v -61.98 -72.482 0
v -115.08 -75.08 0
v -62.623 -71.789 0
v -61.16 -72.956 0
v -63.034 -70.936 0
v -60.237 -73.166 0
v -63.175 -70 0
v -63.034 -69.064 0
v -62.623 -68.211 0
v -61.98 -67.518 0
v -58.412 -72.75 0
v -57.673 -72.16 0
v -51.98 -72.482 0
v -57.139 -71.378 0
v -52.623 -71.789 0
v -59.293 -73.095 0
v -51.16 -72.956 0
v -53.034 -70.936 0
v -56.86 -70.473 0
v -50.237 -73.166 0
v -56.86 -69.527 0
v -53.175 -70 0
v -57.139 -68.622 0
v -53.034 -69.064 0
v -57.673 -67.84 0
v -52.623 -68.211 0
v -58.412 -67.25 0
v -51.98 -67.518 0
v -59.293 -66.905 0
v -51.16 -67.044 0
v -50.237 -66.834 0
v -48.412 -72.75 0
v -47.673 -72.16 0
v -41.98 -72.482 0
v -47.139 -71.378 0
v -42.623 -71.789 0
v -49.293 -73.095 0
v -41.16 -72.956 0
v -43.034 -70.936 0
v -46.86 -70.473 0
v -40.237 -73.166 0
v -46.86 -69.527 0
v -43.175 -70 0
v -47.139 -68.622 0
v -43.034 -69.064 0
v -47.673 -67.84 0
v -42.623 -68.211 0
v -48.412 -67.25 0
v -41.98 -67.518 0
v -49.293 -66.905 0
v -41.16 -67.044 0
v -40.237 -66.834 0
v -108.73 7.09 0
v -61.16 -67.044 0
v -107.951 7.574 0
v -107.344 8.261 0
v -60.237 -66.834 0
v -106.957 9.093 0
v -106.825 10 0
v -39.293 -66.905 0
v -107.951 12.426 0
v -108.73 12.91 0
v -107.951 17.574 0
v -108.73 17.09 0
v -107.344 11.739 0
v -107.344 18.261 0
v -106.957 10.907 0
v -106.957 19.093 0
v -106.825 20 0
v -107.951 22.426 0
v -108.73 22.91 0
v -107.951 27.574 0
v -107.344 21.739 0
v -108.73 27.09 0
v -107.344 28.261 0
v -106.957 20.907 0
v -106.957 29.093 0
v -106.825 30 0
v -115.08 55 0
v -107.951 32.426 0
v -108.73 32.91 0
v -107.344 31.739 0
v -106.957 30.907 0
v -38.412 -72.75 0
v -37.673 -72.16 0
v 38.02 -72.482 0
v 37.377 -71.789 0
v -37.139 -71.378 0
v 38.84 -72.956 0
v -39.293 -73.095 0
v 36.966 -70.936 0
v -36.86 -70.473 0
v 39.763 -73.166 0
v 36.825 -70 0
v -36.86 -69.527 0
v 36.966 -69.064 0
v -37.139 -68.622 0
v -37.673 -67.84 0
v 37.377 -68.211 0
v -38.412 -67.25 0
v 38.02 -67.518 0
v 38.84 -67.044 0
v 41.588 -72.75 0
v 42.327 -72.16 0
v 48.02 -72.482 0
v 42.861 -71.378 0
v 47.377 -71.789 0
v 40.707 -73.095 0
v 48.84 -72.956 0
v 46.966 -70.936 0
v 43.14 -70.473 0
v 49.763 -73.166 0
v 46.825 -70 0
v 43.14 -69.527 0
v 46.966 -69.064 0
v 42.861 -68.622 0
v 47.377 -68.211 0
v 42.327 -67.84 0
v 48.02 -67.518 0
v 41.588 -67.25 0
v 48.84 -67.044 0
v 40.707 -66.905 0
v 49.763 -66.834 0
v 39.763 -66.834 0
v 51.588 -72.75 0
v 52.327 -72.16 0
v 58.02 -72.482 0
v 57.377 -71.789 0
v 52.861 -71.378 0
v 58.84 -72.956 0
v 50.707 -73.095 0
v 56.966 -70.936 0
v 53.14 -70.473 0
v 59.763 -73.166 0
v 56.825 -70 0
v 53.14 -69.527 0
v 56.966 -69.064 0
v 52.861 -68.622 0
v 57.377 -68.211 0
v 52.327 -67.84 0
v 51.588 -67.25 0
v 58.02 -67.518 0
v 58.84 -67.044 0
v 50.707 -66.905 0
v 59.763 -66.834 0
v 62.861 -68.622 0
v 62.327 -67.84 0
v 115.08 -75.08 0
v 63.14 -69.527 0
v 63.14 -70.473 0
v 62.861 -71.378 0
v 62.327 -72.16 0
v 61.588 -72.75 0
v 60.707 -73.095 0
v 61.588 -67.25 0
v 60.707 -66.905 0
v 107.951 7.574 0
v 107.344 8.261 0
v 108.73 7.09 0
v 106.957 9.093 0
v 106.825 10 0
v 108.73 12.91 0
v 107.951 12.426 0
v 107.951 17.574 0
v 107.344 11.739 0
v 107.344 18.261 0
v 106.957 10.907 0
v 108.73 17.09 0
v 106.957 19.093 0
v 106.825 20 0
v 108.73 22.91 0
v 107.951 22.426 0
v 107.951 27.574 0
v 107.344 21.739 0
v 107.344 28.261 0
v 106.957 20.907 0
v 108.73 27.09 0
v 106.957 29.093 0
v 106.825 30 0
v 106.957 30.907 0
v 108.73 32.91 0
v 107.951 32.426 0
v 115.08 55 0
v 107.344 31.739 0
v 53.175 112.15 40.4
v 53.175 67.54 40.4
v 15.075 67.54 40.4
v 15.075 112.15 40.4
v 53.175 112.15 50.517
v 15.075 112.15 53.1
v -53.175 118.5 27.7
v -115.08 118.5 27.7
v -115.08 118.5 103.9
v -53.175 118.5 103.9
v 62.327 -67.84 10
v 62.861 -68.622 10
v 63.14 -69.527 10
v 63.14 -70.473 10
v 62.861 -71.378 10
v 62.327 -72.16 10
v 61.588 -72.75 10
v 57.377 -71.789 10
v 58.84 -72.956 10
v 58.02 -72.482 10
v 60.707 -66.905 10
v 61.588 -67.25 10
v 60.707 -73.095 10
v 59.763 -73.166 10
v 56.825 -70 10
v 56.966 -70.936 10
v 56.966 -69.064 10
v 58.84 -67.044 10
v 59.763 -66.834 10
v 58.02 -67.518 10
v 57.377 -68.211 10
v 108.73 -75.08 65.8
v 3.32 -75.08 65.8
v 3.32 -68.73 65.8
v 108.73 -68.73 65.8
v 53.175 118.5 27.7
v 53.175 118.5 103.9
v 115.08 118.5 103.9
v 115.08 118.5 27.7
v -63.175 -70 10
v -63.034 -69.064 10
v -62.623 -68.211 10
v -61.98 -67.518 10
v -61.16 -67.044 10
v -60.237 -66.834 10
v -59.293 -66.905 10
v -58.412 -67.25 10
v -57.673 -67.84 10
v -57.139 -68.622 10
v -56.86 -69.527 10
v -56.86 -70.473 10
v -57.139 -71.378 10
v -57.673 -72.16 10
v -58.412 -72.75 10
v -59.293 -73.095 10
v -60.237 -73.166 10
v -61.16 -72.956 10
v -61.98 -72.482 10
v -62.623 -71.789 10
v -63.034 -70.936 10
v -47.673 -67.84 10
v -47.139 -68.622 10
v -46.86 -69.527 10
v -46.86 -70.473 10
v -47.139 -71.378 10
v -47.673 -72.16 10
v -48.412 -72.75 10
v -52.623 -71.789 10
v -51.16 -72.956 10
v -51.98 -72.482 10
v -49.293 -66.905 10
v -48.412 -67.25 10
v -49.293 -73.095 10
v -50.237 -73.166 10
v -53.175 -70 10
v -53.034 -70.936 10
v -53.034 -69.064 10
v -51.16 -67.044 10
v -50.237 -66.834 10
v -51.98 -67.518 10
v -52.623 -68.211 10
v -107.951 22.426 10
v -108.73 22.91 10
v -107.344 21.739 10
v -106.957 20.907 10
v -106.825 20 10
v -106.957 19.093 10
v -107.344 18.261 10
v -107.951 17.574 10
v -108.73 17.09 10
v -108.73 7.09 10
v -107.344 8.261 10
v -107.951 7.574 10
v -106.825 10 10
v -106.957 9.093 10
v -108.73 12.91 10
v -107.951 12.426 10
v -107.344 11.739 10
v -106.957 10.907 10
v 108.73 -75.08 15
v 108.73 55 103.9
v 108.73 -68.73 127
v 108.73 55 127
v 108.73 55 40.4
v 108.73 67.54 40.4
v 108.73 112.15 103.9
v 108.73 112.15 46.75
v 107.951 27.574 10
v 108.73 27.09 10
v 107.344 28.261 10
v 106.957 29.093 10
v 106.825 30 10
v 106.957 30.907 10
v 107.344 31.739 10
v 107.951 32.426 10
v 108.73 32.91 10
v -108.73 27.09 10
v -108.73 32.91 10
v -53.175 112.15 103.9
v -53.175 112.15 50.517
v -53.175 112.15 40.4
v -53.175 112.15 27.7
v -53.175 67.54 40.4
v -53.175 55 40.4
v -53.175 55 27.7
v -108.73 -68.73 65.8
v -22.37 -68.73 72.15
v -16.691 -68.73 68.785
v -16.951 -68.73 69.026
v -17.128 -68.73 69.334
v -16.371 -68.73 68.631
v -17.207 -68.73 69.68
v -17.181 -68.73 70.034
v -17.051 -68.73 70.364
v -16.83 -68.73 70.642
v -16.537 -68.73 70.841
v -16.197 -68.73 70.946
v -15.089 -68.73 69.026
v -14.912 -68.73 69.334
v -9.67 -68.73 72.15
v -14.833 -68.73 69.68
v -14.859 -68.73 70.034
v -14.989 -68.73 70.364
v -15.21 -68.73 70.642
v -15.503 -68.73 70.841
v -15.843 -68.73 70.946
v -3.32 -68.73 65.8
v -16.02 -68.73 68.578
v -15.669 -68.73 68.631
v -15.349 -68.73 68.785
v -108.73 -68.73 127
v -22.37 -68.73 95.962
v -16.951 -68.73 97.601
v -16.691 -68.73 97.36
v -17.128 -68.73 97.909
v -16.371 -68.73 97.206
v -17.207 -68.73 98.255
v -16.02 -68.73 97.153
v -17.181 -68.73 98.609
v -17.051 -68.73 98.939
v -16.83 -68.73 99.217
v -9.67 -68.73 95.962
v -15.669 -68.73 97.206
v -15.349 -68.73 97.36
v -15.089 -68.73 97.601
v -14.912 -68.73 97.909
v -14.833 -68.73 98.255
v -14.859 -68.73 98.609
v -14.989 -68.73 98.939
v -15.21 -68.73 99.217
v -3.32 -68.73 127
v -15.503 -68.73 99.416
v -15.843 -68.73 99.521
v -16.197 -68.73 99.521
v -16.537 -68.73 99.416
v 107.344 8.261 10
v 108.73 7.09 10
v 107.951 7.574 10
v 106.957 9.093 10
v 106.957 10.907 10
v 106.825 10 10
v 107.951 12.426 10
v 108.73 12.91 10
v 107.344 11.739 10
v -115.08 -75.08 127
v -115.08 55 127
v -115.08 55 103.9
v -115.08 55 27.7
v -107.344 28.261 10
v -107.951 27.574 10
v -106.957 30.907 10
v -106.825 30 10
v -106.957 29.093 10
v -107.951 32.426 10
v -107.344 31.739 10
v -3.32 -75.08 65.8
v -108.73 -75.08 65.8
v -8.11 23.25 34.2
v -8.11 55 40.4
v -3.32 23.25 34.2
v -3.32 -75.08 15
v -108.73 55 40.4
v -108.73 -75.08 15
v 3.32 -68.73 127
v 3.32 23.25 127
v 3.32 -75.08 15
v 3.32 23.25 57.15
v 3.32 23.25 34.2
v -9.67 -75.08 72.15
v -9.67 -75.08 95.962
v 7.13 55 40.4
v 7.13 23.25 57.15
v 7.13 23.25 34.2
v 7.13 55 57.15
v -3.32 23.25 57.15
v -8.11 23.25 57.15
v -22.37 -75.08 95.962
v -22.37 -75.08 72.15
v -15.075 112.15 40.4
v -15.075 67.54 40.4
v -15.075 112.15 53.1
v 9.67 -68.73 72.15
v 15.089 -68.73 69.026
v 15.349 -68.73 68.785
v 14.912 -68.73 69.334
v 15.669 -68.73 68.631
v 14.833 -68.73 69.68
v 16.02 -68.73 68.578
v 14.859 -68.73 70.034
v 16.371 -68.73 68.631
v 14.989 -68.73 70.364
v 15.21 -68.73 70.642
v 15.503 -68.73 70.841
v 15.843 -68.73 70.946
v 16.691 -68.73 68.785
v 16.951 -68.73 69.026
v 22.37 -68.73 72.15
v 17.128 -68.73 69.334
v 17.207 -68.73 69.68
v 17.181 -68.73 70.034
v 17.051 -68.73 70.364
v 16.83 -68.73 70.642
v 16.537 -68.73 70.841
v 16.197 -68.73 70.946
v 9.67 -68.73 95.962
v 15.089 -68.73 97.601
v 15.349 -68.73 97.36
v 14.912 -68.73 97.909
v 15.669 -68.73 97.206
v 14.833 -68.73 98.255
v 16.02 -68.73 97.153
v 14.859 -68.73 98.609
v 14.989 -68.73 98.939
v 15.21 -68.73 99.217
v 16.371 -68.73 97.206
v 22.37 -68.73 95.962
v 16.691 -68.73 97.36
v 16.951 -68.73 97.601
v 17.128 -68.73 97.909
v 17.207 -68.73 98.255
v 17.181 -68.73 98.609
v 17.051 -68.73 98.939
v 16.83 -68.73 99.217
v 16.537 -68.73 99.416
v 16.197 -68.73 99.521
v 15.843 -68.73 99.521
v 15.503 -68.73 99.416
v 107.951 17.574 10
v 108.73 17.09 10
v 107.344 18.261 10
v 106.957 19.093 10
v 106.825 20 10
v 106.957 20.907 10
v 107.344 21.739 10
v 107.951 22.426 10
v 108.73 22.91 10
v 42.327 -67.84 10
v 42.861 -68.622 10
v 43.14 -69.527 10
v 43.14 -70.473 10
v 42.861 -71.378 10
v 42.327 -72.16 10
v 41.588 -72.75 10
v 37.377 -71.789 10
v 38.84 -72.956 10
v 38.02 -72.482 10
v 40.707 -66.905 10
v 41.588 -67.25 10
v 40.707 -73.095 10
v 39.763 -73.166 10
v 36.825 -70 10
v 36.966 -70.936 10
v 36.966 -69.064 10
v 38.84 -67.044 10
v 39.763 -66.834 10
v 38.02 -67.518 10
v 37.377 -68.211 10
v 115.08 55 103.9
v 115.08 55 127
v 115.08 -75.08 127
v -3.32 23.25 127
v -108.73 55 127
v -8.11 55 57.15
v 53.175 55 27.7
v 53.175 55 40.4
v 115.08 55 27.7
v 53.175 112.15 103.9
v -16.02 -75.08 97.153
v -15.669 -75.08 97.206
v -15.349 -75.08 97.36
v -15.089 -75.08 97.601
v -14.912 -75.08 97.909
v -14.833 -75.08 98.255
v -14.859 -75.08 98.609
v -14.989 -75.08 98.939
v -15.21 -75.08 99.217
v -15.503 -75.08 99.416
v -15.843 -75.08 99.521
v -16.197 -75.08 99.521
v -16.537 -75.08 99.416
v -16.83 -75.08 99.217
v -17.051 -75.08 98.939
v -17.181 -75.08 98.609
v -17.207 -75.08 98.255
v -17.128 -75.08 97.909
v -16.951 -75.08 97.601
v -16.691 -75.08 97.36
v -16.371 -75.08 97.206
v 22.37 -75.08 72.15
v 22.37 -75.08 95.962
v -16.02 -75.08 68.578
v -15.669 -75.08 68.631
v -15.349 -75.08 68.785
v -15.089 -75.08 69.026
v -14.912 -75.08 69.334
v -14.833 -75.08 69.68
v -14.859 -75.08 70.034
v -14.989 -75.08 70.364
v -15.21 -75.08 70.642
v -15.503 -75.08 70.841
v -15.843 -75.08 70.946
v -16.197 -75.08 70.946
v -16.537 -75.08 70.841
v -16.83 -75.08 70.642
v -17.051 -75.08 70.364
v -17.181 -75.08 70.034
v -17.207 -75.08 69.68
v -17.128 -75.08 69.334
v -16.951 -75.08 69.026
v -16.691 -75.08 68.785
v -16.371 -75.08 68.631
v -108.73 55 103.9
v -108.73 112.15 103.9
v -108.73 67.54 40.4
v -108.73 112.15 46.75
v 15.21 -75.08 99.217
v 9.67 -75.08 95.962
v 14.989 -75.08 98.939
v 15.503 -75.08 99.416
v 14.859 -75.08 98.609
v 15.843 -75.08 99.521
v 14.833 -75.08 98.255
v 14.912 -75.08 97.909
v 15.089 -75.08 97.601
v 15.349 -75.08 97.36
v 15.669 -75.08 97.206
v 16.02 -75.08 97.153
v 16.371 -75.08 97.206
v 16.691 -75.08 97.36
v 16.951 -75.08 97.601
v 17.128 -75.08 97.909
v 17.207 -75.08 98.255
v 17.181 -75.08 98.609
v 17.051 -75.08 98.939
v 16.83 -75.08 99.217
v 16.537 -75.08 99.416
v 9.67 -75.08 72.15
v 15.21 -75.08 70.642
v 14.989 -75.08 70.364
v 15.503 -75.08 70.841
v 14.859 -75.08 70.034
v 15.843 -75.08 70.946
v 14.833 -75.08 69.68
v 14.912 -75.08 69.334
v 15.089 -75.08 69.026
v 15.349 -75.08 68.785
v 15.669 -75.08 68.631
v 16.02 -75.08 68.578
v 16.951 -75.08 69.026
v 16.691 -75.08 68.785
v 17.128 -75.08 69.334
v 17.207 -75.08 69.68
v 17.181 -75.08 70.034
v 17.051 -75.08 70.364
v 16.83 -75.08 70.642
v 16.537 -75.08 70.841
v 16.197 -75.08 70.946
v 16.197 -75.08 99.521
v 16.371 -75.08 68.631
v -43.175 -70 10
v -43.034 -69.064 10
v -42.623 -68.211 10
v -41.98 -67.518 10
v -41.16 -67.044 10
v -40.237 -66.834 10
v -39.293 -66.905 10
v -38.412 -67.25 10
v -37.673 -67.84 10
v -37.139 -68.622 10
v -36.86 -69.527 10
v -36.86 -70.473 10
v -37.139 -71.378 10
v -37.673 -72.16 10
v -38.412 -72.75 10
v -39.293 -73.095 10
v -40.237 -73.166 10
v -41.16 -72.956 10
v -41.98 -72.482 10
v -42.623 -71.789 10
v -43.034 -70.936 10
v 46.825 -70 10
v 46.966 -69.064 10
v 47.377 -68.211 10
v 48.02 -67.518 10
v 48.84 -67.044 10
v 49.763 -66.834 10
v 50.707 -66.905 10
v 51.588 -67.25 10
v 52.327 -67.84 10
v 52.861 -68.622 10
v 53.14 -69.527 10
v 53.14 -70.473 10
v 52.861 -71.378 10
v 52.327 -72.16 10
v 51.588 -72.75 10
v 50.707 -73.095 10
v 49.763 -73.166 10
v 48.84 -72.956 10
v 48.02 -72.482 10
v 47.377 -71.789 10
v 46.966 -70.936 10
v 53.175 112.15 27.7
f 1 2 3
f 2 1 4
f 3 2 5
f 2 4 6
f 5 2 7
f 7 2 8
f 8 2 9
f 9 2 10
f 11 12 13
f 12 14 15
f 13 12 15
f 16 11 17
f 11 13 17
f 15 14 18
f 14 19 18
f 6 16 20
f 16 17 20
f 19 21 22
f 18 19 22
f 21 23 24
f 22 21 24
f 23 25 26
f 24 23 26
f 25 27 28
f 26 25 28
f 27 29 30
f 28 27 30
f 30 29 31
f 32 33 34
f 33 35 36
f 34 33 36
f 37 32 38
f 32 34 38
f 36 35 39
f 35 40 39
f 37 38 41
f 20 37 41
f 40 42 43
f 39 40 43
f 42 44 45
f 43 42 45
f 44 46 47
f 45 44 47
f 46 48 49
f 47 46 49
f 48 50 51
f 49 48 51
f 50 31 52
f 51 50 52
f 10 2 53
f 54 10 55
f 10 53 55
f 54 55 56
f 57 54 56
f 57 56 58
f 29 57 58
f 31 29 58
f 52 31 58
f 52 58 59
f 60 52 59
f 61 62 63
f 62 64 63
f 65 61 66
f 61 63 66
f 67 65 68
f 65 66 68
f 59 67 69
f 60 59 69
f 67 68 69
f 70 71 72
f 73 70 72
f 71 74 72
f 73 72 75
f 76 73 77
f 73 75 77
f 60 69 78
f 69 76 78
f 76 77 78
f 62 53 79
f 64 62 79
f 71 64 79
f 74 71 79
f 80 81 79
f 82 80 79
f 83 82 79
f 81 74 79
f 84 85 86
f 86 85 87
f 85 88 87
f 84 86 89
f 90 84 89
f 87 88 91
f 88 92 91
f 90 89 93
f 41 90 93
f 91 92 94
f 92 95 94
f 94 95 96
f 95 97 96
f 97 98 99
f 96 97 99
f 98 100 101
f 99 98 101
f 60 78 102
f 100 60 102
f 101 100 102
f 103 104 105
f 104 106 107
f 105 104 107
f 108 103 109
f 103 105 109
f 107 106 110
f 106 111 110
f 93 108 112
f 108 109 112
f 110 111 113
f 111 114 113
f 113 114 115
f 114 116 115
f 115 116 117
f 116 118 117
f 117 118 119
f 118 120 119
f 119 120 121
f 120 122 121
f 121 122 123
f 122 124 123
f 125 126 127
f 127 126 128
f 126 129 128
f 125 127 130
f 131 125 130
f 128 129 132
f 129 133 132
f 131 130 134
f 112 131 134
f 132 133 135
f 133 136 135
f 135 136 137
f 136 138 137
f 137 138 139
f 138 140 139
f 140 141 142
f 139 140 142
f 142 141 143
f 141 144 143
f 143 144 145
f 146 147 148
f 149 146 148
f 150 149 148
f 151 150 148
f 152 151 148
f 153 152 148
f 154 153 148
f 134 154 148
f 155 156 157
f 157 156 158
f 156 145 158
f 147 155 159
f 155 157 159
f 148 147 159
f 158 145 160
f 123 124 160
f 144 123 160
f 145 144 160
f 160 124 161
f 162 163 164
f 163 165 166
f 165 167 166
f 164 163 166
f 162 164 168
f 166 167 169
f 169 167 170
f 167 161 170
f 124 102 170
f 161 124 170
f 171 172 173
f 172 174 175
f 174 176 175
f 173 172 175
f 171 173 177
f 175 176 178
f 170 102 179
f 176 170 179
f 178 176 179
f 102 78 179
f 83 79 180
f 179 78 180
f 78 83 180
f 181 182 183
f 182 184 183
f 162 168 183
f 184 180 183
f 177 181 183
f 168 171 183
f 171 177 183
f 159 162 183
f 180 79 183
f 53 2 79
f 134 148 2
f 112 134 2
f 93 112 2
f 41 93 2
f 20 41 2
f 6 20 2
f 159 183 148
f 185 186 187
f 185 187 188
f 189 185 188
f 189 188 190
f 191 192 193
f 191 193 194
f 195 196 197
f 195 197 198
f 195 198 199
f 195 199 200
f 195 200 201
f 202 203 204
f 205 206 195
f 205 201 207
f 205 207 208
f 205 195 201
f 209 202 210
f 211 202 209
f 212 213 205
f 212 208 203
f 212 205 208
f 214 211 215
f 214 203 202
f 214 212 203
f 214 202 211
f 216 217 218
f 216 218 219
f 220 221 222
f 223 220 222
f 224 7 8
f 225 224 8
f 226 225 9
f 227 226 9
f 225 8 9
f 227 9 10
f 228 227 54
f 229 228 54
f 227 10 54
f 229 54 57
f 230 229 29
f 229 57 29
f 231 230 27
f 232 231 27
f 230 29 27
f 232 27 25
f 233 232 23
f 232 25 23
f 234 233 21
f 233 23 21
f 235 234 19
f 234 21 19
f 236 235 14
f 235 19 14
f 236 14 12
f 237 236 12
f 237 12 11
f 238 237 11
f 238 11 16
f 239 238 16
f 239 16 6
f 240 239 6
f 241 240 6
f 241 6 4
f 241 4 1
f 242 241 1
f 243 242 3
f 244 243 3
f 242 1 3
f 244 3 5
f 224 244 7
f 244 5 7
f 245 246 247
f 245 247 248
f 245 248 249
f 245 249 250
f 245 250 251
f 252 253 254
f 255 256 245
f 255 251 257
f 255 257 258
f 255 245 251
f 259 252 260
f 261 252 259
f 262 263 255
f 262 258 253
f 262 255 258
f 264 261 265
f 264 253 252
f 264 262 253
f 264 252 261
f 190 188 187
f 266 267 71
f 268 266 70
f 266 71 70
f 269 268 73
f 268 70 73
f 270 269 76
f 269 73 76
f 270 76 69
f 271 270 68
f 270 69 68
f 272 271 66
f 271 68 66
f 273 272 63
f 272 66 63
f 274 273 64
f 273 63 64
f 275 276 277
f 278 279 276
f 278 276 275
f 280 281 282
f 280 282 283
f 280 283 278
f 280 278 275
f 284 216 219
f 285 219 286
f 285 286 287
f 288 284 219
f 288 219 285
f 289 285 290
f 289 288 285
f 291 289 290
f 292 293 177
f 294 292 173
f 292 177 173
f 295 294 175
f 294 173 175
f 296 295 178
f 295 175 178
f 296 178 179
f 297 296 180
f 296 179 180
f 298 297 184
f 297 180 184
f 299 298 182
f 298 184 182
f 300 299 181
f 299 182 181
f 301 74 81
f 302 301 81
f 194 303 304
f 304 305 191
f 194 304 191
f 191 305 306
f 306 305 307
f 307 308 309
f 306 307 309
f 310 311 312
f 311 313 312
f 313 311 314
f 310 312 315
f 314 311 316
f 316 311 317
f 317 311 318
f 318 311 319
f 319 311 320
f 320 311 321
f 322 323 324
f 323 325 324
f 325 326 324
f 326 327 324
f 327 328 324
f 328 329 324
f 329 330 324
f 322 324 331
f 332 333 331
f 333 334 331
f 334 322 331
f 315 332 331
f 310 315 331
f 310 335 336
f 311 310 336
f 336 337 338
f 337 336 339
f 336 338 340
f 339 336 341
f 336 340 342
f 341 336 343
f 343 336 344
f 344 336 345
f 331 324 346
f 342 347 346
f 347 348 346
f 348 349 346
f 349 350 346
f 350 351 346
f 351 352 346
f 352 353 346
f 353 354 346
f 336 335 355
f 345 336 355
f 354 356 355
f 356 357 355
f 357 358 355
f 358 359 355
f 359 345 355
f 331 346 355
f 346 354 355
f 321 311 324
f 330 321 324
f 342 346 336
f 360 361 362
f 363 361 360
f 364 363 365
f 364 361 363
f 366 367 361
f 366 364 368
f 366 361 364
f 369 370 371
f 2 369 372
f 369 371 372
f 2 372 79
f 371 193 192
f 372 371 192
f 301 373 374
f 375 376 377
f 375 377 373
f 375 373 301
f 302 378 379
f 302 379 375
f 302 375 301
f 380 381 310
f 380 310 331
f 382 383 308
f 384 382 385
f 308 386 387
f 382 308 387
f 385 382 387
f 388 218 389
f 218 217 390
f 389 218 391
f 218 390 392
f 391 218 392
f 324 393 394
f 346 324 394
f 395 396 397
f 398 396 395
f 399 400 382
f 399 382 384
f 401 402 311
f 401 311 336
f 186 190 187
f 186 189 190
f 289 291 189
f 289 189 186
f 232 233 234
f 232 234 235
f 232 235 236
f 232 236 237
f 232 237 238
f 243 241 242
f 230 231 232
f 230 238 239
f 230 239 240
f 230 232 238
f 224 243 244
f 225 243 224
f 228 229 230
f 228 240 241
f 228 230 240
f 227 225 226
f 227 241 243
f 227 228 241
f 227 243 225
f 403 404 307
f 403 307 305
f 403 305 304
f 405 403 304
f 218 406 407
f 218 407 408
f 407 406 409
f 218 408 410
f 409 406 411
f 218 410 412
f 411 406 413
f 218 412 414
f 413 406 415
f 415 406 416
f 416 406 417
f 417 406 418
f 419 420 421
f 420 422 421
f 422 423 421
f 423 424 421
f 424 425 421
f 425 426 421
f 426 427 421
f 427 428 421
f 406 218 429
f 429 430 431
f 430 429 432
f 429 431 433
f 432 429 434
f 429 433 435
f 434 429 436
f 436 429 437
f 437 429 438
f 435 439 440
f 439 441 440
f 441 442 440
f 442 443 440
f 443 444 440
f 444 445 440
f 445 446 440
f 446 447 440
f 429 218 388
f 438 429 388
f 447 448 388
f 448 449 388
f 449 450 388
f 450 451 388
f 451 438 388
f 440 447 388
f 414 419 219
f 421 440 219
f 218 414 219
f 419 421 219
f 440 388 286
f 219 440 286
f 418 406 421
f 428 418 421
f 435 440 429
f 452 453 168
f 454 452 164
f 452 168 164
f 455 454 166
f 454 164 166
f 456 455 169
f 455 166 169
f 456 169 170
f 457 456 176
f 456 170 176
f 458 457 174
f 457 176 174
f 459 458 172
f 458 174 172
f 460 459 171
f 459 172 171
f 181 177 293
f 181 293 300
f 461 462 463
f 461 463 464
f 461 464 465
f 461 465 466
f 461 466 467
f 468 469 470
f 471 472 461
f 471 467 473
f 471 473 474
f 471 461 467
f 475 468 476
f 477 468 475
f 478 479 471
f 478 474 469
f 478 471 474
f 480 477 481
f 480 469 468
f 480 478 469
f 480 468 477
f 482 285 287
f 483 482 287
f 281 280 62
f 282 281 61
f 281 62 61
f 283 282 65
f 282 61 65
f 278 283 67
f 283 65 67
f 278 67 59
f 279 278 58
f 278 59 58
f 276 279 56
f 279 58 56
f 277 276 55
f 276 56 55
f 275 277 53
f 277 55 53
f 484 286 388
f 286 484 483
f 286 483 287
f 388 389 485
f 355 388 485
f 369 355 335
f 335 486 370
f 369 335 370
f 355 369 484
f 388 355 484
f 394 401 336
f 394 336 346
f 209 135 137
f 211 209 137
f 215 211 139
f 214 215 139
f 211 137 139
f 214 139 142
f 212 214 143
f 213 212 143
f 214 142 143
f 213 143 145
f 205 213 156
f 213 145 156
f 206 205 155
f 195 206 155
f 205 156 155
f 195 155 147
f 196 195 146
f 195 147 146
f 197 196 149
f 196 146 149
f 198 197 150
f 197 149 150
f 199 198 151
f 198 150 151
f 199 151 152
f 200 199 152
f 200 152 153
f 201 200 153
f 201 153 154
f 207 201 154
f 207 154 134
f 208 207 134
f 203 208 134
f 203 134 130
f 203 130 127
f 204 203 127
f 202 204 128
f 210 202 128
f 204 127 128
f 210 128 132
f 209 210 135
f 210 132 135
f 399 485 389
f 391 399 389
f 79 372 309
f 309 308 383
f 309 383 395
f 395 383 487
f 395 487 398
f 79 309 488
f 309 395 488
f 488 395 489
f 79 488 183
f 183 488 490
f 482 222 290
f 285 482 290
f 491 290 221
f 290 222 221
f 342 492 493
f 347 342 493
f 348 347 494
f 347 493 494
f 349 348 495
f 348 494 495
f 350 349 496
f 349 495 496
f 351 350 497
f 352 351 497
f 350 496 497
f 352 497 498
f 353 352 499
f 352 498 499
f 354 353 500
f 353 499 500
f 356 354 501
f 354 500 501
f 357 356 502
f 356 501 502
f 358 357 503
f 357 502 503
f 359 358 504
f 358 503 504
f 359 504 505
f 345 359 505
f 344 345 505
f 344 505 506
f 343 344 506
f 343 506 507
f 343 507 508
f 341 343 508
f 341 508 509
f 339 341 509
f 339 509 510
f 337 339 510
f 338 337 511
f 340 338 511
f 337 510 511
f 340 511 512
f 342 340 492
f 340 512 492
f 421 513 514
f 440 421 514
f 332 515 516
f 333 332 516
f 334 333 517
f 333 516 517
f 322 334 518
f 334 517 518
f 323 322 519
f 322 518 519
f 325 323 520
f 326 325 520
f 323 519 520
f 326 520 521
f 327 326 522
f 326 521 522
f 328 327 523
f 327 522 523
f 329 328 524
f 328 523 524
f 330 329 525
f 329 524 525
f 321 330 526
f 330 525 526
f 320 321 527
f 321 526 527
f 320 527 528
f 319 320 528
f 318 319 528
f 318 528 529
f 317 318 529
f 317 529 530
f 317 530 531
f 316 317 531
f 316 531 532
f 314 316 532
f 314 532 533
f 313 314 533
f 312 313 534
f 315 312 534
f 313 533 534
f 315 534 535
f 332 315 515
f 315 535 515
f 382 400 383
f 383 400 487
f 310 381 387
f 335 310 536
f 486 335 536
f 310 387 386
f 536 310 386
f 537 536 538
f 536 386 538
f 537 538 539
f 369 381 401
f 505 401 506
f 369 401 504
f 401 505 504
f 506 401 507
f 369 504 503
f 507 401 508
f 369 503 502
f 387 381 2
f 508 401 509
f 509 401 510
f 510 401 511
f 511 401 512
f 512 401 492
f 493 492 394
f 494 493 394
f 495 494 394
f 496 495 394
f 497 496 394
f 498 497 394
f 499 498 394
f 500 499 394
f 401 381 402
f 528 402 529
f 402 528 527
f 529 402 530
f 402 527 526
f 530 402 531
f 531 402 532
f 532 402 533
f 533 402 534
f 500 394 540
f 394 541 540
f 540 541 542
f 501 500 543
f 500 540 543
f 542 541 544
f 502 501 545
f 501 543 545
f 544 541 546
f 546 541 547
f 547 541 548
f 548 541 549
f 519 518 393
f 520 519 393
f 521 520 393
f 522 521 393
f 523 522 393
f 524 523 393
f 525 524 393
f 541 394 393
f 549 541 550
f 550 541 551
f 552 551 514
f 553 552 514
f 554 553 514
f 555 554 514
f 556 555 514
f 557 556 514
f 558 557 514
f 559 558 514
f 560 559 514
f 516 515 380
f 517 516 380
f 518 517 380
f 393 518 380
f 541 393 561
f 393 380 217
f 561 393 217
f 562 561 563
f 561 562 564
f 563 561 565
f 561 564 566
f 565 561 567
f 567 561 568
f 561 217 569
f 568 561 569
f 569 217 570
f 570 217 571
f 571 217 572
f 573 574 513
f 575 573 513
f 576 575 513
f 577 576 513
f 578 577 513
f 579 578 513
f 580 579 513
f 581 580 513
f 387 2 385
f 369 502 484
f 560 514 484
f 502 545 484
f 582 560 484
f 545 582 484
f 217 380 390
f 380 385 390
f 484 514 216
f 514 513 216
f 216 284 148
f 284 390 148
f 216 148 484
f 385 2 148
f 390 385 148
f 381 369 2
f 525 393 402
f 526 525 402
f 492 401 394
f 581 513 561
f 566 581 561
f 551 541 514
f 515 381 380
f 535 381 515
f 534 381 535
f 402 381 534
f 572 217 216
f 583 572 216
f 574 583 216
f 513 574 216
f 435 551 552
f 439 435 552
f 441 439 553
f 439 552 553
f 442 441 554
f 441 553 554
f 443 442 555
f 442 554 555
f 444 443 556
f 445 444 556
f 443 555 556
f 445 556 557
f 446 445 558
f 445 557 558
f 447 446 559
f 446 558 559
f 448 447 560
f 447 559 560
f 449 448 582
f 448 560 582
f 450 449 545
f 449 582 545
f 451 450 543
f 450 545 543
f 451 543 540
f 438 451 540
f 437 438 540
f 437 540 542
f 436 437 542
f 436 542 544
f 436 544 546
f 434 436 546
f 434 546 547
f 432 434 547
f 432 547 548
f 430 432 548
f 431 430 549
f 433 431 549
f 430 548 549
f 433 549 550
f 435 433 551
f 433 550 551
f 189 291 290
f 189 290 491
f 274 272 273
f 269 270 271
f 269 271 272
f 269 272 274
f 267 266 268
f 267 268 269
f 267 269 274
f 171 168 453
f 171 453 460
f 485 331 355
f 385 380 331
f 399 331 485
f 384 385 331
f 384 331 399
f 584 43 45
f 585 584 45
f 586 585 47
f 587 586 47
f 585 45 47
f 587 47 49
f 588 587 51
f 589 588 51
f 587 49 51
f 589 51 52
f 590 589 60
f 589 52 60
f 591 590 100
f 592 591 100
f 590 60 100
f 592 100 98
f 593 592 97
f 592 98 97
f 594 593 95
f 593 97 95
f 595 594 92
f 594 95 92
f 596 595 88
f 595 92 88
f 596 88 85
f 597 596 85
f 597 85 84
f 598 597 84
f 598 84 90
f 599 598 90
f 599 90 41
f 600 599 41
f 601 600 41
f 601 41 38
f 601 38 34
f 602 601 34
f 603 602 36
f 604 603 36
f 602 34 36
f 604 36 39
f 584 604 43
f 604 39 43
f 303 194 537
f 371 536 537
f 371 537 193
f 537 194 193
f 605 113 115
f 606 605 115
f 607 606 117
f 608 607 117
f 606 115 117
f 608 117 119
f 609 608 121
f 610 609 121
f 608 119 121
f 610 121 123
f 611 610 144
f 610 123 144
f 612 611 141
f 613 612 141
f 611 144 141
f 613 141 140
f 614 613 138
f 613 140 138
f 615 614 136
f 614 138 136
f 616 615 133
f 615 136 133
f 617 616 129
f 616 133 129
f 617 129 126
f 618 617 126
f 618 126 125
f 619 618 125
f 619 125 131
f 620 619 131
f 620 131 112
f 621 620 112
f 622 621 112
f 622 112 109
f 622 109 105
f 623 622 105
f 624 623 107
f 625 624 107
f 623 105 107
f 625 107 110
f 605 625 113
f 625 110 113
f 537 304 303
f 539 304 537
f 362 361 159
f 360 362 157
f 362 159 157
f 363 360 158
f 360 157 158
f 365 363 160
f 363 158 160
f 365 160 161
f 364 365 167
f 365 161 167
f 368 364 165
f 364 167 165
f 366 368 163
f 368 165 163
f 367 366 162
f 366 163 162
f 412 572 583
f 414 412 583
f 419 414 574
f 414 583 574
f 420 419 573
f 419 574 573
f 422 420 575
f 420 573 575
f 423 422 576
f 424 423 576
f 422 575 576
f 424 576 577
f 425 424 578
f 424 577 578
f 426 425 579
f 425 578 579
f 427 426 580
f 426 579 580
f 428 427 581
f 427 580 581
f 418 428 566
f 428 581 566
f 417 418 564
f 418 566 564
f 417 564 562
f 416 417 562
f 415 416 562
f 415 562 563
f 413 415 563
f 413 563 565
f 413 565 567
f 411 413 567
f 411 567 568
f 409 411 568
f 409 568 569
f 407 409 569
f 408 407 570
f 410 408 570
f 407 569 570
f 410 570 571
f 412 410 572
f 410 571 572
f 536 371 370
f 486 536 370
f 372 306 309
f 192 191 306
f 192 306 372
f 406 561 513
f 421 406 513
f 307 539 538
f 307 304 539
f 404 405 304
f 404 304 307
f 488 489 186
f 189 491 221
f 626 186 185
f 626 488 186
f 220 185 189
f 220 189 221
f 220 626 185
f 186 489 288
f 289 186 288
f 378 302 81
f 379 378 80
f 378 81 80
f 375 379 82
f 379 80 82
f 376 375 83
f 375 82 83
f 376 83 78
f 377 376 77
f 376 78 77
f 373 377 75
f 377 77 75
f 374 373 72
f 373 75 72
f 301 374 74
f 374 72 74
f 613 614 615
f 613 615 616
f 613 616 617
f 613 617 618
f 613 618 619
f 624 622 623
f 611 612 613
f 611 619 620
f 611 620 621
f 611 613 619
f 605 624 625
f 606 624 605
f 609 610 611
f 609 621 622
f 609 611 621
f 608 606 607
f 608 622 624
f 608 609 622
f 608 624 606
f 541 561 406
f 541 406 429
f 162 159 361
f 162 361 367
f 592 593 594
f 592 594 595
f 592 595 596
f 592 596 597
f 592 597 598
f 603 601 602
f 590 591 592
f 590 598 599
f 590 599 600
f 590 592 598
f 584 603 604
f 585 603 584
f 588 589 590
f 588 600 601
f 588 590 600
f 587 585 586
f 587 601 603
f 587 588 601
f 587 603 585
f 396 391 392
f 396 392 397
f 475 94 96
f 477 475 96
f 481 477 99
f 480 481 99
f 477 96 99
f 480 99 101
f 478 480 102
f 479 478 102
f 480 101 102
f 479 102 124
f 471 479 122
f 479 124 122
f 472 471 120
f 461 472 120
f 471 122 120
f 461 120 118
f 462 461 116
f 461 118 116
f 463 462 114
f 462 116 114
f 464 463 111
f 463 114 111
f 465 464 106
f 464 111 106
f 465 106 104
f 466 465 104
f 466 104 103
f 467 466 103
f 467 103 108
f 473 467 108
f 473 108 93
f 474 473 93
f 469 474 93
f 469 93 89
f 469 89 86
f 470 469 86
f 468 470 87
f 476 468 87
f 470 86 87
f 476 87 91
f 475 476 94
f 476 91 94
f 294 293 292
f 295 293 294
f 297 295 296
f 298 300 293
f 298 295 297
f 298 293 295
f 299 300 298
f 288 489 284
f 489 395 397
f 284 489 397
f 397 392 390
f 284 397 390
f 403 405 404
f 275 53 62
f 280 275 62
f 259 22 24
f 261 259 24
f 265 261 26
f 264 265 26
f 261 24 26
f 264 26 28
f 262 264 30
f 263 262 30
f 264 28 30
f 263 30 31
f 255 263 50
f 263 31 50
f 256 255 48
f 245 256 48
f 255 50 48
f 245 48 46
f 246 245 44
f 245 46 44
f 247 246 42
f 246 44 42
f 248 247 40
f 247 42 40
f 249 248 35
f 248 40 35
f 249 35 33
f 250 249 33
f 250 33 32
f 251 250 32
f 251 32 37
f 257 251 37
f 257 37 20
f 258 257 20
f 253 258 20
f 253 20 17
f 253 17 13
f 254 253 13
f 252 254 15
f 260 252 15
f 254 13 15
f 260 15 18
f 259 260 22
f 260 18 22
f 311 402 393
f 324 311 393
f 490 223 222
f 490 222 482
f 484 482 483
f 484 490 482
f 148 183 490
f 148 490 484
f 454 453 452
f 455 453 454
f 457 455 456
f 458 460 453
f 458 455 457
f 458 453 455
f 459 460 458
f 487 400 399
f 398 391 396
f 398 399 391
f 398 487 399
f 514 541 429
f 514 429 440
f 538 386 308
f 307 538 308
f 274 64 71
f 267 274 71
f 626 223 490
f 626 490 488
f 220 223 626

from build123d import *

# Parameters (mm, degrees)
SKETCH1_W            = 230.16
SKETCH1_H            = 130.080000074
BOSS_EXTRUDE1_DEPTH  = 15
SKETCH2_R            = 3.175
CUT_EXTRUDE1_DEPTH   = 10
BOSS_EXTRUDE2_DEPTH  = 230.16
SKETCH5_W            = 6.35
SKETCH5_H            = 130.080000074
SKETCH5_W_2          = 6.64
BOSS_EXTRUDE3_DEPTH  = 127
SKETCH6_W            = 55.554601445
SKETCH6_H            = 12.7
SKETCH6_W_2          = 55.555398555
BOSS_EXTRUDE4_DEPTH  = 57.15
SKETCH17_W           = 6.35
SKETCH17_H           = 57.15
BOSS_EXTRUDE9_DEPTH  = 76.2
SKETCH18_W           = 15.24
SKETCH18_H           = 31.75
CUT_EXTRUDE2_DEPTH   = 69.85
SKETCH19_W           = 3.81
SKETCH19_H           = 31.75
SKETCH19_W_2         = 4.79
BOSS_EXTRUDE10_DEPTH = 25.4
SKETCH20_W           = 230.16
SKETCH20_H           = 61.2
BOSS_EXTRUDE12_DEPTH = 6.35
SKETCH21_R           = 1.190625
SKETCH21_W           = 12.7
SKETCH21_H           = 23.8125
CUT_EXTRUDE3_DEPTH   = 6.35


with BuildPart() as part:
    # Sketch1 → Boss-Extrude1 (new body)
    with BuildSketch(Plane.XY):
        with Locations((0, -10.039999963)):
            Rectangle(SKETCH1_W, SKETCH1_H)
    extrude(amount=BOSS_EXTRUDE1_DEPTH)

    # Sketch2 → Cut-Extrude1 (cut)
    with BuildSketch(Plane(origin=(0, 0, 0), x_dir=(-1, 0, 0), z_dir=(0, 0, -1))):
        with Locations((60, -70)):
            Circle(SKETCH2_R)
        with Locations((50, -70)):
            Circle(SKETCH2_R)
        with Locations((40, -70)):
            Circle(SKETCH2_R)
        with Locations((-40, -70)):
            Circle(SKETCH2_R)
        with Locations((-50, -70)):
            Circle(SKETCH2_R)
        with Locations((-60, -70)):
            Circle(SKETCH2_R)
        with Locations((-110, 10)):
            Circle(SKETCH2_R)
        with Locations((-110, 20)):
            Circle(SKETCH2_R)
        with Locations((-110, 30)):
            Circle(SKETCH2_R)
        with Locations((110, 10)):
            Circle(SKETCH2_R)
        with Locations((110, 20)):
            Circle(SKETCH2_R)
        with Locations((110, 30)):
            Circle(SKETCH2_R)
    extrude(amount=-CUT_EXTRUDE1_DEPTH, mode=Mode.SUBTRACT)

    # Sketch4 → Boss-Extrude2 (add)
    with BuildSketch(Plane.ZY.offset(115.08)):
        Polygon((15, -75.08), (15, 55.000000074), (40.4, 55.000000074), align=None)
    extrude(amount=-BOSS_EXTRUDE2_DEPTH)

    # Sketch5 → Boss-Extrude3 (add)
    with BuildSketch(Plane(origin=(0, 0, 0), x_dir=(-1, 0, 0), z_dir=(0, 0, -1))):
        with Locations((111.905, -10.039999963)):
            Rectangle(SKETCH5_W, SKETCH5_H)
        with Locations((-111.905, -10.039999963)):
            Rectangle(SKETCH5_W, SKETCH5_H)
        with Locations((0, -10.039999963)):
            Rectangle(SKETCH5_W_2, SKETCH5_H)
    extrude(amount=-BOSS_EXTRUDE3_DEPTH)

    # Sketch6 → Boss-Extrude4 (add)
    with BuildSketch(Plane(origin=(0, 55.000000074, 0), x_dir=(1, 0, 0), z_dir=(0, 1, 0))):
        with Locations((-80.952699278, -34.05)):
            Rectangle(SKETCH6_W, SKETCH6_H)
        with Locations((80.952300722, -34.05)):
            Rectangle(SKETCH6_W_2, SKETCH6_H)
    extrude(amount=BOSS_EXTRUDE4_DEPTH)

    # Sketch14 → Loft1 section 0
    with BuildSketch(Plane.ZY.offset(108.73)):
        with BuildLine():
            Line((40.4, 67.540000074), (40.4, 112.150000074))
            Line((40.4, 112.150000074), (46.75, 112.150000074))
            Line((46.75, 112.150000074), (40.4, 67.540000074))
        make_face()
    # Sketch13 → Loft1 section 1
    with BuildSketch(Plane(origin=(-15.075398555, 0, 0), x_dir=(0, 0, -1), z_dir=(1, 0, 0))):
        with BuildLine():
            Line((-40.4, 112.150000074), (-40.4, 67.540000074))
            Line((-40.4, 67.540000074), (-53.1, 112.150000074))
            Line((-53.1, 112.150000074), (-40.4, 112.150000074))
        make_face()
    loft()

    # Sketch15 → Loft2 section 0
    with BuildSketch(Plane.ZY.offset(-15.074601445)):
        with BuildLine():
            Line((53.1, 112.150000074), (40.4, 67.540000074))
            Line((40.4, 67.540000074), (40.4, 112.150000074))
            Line((40.4, 112.150000074), (53.1, 112.150000074))
        make_face()
    # Sketch16 → Loft2 section 1
    with BuildSketch(Plane(origin=(108.73, 0, 0), x_dir=(0, 0, -1), z_dir=(1, 0, 0))):
        with BuildLine():
            Line((-40.4, 112.150000074), (-46.75, 112.150000074))
            Line((-46.75, 112.150000074), (-40.4, 67.540000074))
            Line((-40.4, 67.540000074), (-40.4, 112.150000074))
        make_face()
    loft()

    # Sketch17 → Boss-Extrude9 (add)
    with BuildSketch(Plane(origin=(0, 0, 27.7), x_dir=(-1, 0, 0), z_dir=(0, 0, -1))):
        Polygon((-115.08, 112.150000074), (-108.73, 112.150000074), (-53.174601445, 112.150000074), (-53.174601445, 118.500000074), (-115.08, 118.500000074), align=None)
        with Locations((-111.905, 83.575000074)):
            Rectangle(SKETCH17_W, SKETCH17_H)
        Polygon((108.73, 112.150000074), (115.08, 112.150000074), (115.08, 118.500000074), (53.175398555, 118.500000074), (53.175398555, 112.150000074), align=None)
        with Locations((111.905, 83.575000074)):
            Rectangle(SKETCH17_W, SKETCH17_H)
    extrude(amount=-BOSS_EXTRUDE9_DEPTH)

    # Sketch18 → Cut-Extrude2 (cut)
    with BuildSketch(Plane.XY.offset(127)):
        with Locations((-0.33125, 39.125000074)):
            Rectangle(SKETCH18_W, SKETCH18_H)
    extrude(amount=-CUT_EXTRUDE2_DEPTH, mode=Mode.SUBTRACT)

    # Sketch19 → Boss-Extrude10 (add)
    with BuildSketch(Plane.XY.offset(57.15)):
        with Locations((5.225, 39.125000074)):
            Rectangle(SKETCH19_W, SKETCH19_H)
        with Locations((-5.715, 39.125000074)):
            Rectangle(SKETCH19_W_2, SKETCH19_H)
    extrude(amount=-BOSS_EXTRUDE10_DEPTH)

    # Sketch20 → Boss-Extrude12 (add)
    with BuildSketch(Plane.XZ.offset(75.08)):
        with Locations((0, 96.4)):
            Rectangle(SKETCH20_W, SKETCH20_H)
    extrude(amount=-BOSS_EXTRUDE12_DEPTH)

    # Sketch21 → Cut-Extrude3 (cut)
    with BuildSketch(Plane.XZ.offset(75.08)):
        with Locations(Location((-16.02, 69.76875, 0), (0, 0, 270))):
            Circle(SKETCH21_R)
        with Locations(Location((-16.02, 98.34375, 0), (0, 0, 270))):
            Circle(SKETCH21_R)
        with Locations(Location((16.02, 69.76875, 0), (0, 0, 270))):
            Circle(SKETCH21_R)
        with Locations(Location((16.02, 98.34375, 0), (0, 0, 270))):
            Circle(SKETCH21_R)
        with Locations((-16.02, 84.05625)):
            Rectangle(SKETCH21_W, SKETCH21_H)
        with Locations((16.02, 84.05625)):
            Rectangle(SKETCH21_W, SKETCH21_H)
    extrude(amount=-CUT_EXTRUDE3_DEPTH, mode=Mode.SUBTRACT)


solid = part.part
